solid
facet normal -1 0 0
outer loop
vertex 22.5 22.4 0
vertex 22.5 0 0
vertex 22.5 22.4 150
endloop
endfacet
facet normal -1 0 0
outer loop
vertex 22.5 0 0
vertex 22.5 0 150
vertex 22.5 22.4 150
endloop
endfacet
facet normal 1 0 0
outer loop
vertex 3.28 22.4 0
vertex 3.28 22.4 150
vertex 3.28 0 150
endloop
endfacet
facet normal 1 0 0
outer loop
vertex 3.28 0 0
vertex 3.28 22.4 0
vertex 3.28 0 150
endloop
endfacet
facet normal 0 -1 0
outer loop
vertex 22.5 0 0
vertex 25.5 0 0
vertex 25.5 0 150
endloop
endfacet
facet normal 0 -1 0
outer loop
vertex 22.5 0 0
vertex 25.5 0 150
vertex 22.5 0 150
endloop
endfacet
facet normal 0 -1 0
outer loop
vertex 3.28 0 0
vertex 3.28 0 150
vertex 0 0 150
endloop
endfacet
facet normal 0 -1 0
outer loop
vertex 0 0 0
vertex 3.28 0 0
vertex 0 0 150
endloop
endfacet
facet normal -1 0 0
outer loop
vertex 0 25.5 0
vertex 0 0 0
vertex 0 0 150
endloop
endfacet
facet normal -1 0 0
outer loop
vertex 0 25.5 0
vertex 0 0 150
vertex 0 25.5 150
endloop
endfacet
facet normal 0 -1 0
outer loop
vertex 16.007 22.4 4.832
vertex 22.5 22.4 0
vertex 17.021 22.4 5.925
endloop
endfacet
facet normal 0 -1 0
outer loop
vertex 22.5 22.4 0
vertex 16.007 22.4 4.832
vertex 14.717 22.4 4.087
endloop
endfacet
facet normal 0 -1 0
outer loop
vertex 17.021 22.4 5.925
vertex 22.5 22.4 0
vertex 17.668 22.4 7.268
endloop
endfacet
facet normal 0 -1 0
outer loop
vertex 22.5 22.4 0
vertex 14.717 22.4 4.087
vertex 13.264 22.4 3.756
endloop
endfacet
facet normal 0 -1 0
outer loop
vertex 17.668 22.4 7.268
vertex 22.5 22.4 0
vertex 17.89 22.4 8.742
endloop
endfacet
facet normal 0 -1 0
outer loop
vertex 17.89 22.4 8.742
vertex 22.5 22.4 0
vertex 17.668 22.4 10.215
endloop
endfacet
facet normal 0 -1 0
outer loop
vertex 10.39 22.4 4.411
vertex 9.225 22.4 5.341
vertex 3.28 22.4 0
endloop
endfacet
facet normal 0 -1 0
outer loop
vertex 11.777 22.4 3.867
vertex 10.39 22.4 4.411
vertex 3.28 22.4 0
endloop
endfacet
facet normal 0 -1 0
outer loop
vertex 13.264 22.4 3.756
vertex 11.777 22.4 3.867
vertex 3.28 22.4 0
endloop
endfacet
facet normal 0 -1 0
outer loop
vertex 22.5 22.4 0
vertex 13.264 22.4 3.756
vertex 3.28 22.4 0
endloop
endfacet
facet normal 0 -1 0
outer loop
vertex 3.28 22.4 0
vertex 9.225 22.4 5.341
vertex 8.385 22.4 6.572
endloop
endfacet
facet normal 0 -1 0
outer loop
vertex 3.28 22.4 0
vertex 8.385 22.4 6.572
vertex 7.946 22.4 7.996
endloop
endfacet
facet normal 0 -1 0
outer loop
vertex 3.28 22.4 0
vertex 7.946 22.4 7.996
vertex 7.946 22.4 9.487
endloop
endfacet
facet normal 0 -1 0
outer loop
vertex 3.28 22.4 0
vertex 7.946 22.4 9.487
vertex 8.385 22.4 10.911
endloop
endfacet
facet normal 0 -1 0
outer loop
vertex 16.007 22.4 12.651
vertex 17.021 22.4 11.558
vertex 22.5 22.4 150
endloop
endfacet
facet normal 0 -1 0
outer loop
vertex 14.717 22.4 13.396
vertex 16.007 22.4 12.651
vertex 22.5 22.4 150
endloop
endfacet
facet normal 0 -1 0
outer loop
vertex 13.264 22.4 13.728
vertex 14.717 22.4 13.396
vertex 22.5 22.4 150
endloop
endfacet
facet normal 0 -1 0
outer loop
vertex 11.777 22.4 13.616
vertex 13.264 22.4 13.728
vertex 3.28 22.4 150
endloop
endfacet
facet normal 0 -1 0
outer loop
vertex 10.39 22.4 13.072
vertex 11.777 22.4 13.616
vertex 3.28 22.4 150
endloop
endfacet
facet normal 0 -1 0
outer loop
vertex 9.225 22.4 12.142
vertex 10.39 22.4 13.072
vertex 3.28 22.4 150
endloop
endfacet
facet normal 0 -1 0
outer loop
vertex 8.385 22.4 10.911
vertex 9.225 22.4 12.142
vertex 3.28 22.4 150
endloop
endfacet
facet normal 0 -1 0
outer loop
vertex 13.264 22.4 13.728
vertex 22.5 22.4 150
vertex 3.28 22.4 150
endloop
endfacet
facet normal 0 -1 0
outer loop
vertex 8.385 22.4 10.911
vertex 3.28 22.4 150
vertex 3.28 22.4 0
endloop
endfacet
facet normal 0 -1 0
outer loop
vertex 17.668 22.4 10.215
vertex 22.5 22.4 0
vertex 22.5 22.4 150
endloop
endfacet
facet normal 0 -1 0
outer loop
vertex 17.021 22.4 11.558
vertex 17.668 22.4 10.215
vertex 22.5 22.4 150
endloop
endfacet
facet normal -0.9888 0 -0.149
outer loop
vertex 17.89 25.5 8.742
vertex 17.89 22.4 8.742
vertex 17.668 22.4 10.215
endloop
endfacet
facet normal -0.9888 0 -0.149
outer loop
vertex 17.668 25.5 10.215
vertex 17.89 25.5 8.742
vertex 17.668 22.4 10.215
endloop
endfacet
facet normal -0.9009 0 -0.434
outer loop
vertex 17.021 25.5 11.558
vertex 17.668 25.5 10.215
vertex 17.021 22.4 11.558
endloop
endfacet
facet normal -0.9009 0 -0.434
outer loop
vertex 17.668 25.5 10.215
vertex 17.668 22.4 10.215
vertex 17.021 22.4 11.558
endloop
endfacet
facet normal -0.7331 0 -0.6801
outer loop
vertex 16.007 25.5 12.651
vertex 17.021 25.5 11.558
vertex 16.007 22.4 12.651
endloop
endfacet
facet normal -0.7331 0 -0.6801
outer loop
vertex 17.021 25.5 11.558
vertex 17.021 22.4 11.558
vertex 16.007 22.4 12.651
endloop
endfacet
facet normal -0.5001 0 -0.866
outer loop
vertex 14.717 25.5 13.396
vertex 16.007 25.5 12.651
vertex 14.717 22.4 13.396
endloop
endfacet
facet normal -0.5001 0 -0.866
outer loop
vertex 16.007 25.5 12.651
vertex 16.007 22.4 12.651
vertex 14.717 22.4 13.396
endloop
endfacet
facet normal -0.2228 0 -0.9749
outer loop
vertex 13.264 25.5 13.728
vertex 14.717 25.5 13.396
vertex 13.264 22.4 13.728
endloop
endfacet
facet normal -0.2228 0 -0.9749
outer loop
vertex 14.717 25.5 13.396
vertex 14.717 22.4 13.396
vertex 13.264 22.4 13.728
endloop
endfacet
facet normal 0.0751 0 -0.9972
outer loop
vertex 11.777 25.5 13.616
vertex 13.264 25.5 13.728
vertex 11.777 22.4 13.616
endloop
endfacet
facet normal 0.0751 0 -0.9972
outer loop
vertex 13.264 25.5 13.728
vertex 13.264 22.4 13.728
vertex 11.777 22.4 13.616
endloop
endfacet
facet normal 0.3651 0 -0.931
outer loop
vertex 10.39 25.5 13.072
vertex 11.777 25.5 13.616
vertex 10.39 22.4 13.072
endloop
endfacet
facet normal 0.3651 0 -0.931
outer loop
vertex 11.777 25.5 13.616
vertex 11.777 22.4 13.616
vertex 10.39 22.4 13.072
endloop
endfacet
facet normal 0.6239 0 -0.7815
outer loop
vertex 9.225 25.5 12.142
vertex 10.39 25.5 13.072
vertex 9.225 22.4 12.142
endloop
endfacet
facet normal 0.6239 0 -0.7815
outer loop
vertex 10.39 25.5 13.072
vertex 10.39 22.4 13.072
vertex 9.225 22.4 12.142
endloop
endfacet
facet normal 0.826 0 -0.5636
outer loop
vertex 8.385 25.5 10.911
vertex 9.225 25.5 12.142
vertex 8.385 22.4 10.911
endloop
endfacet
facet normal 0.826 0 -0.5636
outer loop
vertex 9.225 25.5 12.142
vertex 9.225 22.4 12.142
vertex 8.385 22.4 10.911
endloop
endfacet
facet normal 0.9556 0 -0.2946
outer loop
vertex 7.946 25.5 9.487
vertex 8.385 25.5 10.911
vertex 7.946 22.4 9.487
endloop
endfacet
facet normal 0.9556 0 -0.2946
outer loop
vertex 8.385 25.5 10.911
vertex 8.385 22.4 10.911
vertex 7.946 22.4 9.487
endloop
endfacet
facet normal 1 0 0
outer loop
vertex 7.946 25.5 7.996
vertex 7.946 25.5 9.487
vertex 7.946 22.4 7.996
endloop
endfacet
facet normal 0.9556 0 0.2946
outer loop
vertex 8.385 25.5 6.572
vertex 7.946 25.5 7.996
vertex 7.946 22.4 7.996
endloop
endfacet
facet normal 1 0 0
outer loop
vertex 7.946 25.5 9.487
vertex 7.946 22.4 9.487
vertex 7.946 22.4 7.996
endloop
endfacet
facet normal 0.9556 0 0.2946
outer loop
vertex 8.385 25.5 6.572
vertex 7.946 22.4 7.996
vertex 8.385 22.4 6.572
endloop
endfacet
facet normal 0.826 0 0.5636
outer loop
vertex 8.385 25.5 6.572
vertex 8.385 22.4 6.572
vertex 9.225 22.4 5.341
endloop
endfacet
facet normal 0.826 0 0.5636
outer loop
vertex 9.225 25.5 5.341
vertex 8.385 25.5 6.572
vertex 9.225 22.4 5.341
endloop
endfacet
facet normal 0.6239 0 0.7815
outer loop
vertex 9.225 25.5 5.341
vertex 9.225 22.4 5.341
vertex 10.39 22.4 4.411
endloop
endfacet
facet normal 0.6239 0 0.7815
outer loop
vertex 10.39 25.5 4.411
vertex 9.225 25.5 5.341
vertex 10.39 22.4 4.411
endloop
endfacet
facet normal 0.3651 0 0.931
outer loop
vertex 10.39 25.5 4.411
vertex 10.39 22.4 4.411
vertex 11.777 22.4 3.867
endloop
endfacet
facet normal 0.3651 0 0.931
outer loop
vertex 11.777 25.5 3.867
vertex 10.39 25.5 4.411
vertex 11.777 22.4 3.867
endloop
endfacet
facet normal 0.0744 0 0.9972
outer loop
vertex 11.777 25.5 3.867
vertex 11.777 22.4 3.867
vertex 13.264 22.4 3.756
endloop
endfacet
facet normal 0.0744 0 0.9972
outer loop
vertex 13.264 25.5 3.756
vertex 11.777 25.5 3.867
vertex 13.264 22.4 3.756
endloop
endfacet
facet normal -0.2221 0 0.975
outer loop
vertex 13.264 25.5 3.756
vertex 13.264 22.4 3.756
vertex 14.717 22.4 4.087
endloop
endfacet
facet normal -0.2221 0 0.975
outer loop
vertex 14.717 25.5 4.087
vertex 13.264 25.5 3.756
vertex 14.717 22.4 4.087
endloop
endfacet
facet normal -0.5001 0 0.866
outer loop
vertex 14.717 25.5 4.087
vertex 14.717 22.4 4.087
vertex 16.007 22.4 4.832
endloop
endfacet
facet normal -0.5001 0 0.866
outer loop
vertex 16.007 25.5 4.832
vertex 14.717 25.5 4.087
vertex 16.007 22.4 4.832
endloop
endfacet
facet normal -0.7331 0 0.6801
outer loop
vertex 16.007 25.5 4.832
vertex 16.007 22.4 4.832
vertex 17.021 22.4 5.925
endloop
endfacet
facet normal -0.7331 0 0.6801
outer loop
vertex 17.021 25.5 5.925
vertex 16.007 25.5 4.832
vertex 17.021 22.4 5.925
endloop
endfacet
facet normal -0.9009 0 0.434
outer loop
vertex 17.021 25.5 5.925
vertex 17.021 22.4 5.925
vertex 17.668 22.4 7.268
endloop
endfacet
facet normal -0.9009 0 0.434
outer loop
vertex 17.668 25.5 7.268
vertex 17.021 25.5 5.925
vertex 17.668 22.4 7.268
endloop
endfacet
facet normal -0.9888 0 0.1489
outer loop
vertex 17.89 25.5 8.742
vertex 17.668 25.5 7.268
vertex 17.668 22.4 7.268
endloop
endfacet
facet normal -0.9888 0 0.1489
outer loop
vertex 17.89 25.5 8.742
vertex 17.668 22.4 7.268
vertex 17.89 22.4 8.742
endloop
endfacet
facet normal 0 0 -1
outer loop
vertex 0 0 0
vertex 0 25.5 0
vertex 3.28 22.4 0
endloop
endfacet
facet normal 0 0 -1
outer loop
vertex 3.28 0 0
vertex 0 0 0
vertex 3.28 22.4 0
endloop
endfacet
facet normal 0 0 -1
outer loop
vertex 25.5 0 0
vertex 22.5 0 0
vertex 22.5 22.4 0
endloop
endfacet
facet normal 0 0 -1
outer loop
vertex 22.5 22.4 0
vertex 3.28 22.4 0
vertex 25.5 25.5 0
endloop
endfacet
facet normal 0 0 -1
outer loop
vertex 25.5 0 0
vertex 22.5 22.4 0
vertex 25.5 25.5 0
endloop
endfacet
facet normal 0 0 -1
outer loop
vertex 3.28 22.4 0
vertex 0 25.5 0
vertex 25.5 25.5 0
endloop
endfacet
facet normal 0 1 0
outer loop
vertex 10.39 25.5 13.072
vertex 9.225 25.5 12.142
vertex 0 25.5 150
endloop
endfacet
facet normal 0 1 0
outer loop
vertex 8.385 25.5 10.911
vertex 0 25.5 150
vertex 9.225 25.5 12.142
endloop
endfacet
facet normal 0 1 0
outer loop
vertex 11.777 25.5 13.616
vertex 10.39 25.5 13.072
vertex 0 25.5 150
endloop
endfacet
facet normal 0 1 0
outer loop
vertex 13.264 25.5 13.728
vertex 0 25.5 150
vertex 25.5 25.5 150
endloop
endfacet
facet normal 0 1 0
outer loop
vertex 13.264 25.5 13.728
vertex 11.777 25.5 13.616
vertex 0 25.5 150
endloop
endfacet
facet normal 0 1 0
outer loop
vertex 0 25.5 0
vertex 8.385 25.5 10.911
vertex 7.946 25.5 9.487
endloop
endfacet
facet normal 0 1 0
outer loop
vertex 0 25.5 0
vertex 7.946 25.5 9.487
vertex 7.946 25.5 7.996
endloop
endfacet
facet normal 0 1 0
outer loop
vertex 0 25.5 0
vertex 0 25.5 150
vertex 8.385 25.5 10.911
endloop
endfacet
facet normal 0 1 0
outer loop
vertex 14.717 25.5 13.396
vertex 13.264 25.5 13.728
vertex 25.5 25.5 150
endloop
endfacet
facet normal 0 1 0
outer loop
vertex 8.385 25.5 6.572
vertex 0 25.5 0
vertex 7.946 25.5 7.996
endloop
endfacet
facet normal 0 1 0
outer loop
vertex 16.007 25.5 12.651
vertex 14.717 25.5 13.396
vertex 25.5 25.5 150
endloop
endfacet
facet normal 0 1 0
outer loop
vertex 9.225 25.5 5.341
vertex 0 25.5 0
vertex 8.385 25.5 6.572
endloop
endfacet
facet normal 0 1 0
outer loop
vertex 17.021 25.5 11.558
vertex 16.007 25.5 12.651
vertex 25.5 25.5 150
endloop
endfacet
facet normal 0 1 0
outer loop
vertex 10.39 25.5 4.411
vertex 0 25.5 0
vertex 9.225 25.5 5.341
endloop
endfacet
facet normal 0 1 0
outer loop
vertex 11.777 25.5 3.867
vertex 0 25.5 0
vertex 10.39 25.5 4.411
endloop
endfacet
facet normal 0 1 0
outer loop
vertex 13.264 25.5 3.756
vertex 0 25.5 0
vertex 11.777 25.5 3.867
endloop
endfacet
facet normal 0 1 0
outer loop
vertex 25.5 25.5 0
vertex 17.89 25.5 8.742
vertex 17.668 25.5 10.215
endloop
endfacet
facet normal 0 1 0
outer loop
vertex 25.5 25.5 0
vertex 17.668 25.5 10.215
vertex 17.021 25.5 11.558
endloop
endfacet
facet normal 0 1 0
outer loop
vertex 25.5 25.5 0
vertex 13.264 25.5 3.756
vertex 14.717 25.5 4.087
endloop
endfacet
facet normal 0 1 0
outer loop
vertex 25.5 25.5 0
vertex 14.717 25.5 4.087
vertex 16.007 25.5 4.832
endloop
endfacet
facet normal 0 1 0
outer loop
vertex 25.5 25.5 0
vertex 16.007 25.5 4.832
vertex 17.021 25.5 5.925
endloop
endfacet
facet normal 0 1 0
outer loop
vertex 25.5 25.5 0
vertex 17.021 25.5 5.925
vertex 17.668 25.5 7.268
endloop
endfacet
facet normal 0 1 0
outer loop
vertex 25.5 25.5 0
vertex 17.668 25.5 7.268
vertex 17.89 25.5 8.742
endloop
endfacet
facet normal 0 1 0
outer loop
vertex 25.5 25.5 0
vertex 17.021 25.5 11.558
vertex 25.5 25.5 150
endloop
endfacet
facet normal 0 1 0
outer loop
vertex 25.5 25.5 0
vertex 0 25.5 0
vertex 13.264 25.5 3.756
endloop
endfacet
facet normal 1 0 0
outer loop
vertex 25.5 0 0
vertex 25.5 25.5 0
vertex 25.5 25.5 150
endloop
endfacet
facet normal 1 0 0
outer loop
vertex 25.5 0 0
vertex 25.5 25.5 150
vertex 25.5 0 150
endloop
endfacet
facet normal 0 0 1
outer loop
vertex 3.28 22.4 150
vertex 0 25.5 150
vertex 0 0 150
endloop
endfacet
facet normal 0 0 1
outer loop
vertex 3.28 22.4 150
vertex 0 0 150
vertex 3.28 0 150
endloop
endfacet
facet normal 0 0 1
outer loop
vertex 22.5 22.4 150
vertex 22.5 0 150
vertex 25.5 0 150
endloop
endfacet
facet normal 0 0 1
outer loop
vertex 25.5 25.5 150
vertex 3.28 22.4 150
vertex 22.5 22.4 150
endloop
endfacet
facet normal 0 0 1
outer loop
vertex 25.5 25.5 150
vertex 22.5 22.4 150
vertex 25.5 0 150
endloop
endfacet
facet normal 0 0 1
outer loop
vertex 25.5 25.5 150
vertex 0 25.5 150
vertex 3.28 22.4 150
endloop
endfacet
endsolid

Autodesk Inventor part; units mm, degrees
ref_plane "YZ Plane" through (0, 0, 0) normal (1, 0, 0) x (0, 1, 0)
ref_plane "XZ Plane" through (0, 0, 0) normal (0, 1, 0) x (-1, 0, 0)
ref_plane "XY Plane" through (0, 0, 0) normal (0, 0, 1) x (1, 0, 0)
sketch "草圖1" plane through (0, 0, 0) normal (0, 0, 1) x (1, 0, 0)
  line L0 (0, 0) -> (0, 25.5)
  line L1 (0, 25.5) -> (25.5, 25.5)
  line L2 (25.5, 25.5) -> (25.5, 0)
  line L3 (25.5, 0) -> (0, 0)
  dimension "d0" = 25.5
  dimension "d1" = 25.5
extrude "擠出1" add sketch "草圖1" along normal blind 150
sketch "草圖2" plane through (0, 0, 150) normal (0, 0, 1) x (1, 0, 0)
  line L0 (3.28, -7.124) -> (22.5, -7.124)
  line L1 (22.5, -7.124) -> (22.5, 22.4)
  line L2 (22.5, 22.4) -> (3.28, 22.4)
  line L3 (3.28, 22.4) -> (3.28, -7.124)
  line L4 (0, 0) -> (25.5, 0) projected
  dimension "d4" = 19.22
  dimension "d5" = 22.4
  dimension "d6" = 3
extrude "擠出2" cut sketch "草圖2" against normal through all
sketch "草圖3" plane through (3.28, 22.4, 150) normal (0, -1, 0) x (1, 0, 0)
  circle A0 centre (9.61, -141.2584) radius 5
  point P0 (-3.28, -150)
  dimension "d9" = 10
extrude "擠出3" cut sketch "草圖3" against normal blind 150
properties part number "ㄇ形件" material "鋁合金 6061"
